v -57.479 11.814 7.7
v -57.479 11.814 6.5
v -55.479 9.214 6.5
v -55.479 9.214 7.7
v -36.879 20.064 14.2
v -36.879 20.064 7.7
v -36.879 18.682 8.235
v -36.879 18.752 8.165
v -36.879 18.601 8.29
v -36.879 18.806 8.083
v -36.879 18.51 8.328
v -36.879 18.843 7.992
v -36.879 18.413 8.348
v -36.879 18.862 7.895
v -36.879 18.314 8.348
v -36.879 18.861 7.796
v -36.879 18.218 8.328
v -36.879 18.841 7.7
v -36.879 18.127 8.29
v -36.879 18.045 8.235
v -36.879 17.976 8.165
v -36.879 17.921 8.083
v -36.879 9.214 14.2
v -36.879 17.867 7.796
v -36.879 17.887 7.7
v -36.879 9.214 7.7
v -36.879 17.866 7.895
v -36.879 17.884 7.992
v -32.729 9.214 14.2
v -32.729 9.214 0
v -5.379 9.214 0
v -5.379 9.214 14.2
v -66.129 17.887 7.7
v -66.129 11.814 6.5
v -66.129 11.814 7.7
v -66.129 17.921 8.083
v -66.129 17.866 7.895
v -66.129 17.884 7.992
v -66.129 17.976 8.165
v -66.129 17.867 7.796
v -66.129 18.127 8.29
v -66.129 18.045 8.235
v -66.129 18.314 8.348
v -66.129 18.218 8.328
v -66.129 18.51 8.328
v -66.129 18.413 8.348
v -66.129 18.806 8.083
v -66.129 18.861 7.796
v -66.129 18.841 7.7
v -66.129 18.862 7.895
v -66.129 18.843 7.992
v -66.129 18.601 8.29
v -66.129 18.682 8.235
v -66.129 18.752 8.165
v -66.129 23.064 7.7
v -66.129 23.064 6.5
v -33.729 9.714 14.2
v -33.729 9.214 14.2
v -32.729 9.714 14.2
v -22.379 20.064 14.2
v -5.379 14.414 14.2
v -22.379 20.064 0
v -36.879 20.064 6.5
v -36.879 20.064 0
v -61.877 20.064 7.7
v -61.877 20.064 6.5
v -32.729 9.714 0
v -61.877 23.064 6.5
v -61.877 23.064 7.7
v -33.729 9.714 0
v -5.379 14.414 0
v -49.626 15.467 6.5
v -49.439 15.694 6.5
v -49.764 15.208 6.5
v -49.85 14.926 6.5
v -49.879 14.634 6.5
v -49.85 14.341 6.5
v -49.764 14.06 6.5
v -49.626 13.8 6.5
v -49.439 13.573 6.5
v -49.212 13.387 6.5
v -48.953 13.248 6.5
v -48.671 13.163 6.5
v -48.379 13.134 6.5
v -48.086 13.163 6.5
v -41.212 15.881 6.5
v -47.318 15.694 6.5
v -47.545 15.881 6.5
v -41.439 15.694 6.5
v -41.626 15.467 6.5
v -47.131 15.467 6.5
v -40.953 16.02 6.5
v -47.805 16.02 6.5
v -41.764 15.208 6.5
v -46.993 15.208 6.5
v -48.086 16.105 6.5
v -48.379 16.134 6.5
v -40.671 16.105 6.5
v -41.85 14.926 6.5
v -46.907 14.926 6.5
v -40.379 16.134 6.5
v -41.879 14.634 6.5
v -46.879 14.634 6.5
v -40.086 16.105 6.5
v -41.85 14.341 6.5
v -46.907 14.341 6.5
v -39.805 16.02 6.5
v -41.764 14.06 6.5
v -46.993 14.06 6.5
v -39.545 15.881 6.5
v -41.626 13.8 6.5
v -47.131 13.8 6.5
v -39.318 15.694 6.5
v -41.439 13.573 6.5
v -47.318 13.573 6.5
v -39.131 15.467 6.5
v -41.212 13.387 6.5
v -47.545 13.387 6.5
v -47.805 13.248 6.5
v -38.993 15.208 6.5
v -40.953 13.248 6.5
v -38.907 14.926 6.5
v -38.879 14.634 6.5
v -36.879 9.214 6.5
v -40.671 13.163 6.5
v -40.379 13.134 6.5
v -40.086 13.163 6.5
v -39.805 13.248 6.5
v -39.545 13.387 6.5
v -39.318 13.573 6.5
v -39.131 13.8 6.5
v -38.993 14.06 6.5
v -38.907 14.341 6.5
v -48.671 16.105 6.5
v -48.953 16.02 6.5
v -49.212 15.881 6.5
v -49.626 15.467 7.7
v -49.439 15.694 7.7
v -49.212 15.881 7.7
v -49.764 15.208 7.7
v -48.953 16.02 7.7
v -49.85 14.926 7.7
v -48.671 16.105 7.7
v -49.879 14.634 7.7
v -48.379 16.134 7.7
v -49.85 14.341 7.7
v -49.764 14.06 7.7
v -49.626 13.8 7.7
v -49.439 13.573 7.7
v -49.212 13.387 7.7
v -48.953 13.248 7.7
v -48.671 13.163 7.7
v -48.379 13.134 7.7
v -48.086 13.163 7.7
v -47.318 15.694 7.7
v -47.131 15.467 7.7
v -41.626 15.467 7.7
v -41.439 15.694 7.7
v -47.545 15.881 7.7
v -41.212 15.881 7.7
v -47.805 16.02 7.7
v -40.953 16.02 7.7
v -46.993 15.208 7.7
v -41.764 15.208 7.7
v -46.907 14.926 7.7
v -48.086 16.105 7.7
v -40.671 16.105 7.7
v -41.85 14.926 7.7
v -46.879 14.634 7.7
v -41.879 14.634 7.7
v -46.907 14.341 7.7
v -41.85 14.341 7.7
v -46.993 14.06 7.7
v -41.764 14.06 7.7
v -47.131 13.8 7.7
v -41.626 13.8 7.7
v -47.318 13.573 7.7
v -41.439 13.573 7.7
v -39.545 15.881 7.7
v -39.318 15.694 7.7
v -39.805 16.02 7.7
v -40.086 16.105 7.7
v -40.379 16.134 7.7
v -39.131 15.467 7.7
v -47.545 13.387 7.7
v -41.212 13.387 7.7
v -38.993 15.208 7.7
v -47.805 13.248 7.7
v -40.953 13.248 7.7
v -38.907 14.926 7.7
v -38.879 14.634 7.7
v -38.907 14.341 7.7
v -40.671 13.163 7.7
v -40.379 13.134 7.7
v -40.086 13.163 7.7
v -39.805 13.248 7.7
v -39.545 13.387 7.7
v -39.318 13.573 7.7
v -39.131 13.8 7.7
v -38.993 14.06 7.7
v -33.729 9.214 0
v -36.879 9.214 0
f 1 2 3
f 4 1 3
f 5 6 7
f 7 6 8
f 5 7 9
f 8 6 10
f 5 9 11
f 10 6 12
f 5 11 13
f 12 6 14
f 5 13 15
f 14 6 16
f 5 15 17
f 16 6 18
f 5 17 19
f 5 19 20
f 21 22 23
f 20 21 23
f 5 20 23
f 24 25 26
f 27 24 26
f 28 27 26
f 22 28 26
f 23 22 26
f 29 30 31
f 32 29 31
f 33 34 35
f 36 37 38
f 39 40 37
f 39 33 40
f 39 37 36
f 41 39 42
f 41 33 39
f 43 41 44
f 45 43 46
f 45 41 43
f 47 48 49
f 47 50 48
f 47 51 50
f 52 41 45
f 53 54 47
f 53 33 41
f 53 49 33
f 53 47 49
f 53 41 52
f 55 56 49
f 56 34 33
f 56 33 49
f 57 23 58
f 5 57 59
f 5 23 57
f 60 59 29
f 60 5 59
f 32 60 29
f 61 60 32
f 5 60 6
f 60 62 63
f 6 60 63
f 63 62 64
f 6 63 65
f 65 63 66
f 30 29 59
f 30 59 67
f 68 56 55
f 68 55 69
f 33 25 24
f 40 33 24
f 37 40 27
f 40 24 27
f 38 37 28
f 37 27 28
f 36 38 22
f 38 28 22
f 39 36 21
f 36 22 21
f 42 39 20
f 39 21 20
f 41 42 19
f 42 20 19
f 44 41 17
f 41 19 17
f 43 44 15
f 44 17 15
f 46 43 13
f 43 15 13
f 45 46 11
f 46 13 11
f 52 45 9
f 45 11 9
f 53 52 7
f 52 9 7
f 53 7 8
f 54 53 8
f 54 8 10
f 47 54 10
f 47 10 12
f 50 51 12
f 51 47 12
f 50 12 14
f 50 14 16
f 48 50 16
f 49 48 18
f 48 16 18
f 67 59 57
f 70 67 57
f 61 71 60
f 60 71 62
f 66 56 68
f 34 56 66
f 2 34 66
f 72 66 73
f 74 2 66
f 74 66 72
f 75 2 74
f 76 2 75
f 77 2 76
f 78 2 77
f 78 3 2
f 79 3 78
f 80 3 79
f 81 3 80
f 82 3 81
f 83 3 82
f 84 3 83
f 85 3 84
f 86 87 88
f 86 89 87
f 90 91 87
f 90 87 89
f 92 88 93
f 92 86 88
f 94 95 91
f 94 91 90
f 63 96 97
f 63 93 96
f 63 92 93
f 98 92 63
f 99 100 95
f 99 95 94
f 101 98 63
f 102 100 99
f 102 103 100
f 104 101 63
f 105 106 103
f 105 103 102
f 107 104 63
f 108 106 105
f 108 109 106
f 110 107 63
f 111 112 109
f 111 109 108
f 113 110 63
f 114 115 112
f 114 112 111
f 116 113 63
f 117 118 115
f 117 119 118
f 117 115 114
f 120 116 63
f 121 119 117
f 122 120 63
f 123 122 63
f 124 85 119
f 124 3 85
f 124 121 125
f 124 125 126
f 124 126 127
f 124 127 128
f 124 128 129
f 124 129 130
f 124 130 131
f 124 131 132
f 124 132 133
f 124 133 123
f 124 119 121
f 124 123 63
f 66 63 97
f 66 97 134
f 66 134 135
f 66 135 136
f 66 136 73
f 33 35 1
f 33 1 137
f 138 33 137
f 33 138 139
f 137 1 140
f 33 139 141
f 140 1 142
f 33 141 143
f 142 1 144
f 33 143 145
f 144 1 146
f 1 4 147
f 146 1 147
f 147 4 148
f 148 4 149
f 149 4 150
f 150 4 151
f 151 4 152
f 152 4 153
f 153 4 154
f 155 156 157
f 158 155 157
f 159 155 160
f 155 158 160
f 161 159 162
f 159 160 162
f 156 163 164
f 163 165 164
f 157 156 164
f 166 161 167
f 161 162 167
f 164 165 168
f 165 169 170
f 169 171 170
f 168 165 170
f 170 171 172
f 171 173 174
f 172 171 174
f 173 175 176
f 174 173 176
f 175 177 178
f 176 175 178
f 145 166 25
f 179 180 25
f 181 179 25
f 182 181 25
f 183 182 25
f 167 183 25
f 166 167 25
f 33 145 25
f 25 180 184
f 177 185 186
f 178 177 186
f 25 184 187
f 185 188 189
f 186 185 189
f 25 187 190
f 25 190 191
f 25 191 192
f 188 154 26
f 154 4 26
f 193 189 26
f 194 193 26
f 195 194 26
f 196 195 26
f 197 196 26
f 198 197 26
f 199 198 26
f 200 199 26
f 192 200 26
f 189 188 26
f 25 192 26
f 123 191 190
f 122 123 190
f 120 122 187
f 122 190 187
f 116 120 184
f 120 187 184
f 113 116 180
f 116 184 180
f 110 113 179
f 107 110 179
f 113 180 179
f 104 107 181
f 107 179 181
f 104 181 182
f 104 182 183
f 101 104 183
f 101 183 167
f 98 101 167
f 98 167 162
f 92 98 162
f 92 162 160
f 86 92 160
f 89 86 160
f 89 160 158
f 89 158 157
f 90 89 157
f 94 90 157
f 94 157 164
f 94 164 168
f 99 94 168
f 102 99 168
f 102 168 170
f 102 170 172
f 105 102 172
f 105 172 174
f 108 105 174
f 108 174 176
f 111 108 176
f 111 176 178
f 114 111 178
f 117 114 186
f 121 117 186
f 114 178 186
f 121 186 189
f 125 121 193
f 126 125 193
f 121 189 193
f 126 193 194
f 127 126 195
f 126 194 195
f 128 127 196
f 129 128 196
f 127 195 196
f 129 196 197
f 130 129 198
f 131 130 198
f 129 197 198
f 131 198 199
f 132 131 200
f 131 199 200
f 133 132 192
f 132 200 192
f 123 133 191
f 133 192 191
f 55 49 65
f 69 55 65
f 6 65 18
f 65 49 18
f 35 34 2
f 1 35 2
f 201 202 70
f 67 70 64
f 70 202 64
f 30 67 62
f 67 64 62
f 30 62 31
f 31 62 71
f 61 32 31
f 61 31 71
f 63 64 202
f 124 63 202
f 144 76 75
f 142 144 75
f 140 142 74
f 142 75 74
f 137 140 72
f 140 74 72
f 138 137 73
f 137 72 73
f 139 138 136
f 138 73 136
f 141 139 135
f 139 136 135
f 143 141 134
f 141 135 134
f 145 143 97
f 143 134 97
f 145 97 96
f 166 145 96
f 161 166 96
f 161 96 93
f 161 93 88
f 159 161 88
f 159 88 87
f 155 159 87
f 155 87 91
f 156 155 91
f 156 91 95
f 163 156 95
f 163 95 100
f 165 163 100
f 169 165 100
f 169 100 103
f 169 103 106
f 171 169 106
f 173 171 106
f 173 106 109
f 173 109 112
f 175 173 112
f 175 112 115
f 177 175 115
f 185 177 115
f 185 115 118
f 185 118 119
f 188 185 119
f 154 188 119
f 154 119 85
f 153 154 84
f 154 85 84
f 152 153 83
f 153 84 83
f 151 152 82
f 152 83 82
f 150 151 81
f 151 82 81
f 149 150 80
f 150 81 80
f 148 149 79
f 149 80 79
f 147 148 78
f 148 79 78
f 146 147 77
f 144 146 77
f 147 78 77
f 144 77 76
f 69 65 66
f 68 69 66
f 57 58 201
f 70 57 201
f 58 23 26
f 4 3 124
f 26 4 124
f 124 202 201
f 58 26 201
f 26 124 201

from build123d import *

# Parameters (mm, degrees)
DODANIE_WYCI_GNI_CIE1_DEPTH = 14.2
SZKIC2_W                    = 1.2
SZKIC2_H                    = 10.85
DODANIE_WYCI_GNI_CIE3_DEPTH = 29.25
SZKIC6_W                    = 4.251450278
SZKIC6_H                    = 1.2
DODANIE_WYCI_GNI_CIE4_DEPTH = 3
SZKIC20_R                   = 1.5
WYTNIJ_WYCI_GNI_CIE5_DEPTH  = 10
WYTNIJ_WYCI_GNI_CIE3_DEPTH  = 0.5
SZKIC11_R                   = 0.5
DODANIE_WYCI_GNI_CIE5_DEPTH = 29.25
WYTNIJ_WYCI_GNI_CIE6_DEPTH  = 10
SZKIC23_R                   = 1.5
WYTNIJ_WYCI_GNI_CIE8_DEPTH  = 10


with BuildPart() as part:
    # Szkic1 → Dodanie-wyciągnięcie1 (new body)
    with BuildSketch(Plane.XY):
        Polygon((-36.878659539, 9.21375), (-5.378659539, 9.21375), (-5.378659539, 14.41375), (-22.378659539, 20.06375), (-36.878659539, 20.06375), align=None)
    extrude(amount=DODANIE_WYCI_GNI_CIE1_DEPTH)

    # Szkic2 → Dodanie-wyciągnięcie3 (add)
    with BuildSketch(Plane.ZY.offset(36.878659539)):
        with Locations((7.1, 14.63875)):
            Rectangle(SZKIC2_W, SZKIC2_H)
    extrude(amount=DODANIE_WYCI_GNI_CIE3_DEPTH)

    # Szkic6 → Dodanie-wyciągnięcie4 (add)
    with BuildSketch(Plane(origin=(0, 20.06375, 0), x_dir=(1, 0, 0), z_dir=(0, 1, 0))):
        with Locations((-64.0029344, -7.1)):
            Rectangle(SZKIC6_W, SZKIC6_H)
    extrude(amount=DODANIE_WYCI_GNI_CIE4_DEPTH)

    # Szkic20 → Wytnij-wyciągnięcie5 (cut)
    with BuildSketch(Plane.XY.offset(7.7)):
        with Locations((-40.378659539, 14.63375)):
            Circle(SZKIC20_R)
    extrude(amount=-WYTNIJ_WYCI_GNI_CIE5_DEPTH, mode=Mode.SUBTRACT)

    # Szkic10 → Wytnij-wyciągnięcie3 (cut)
    with BuildSketch(Plane.XZ.offset(-9.21375)):
        Polygon((-33.729246345, 6.369364803), (-33.729246345, 14.2), (-32.729246345, 14.2), (-32.729246345, 0), (-33.729246345, 0), align=None)
    extrude(amount=-WYTNIJ_WYCI_GNI_CIE3_DEPTH, mode=Mode.SUBTRACT)

    # Szkic11 → Dodanie-wyciągnięcie5 (add)
    with BuildSketch(Plane.ZY.offset(36.878659539)):
        with Locations((7.85, 18.36375)):
            Circle(SZKIC11_R)
    extrude(amount=DODANIE_WYCI_GNI_CIE5_DEPTH)

    # Szkic21 → Wytnij-wyciągnięcie6 (cut)
    with BuildSketch(Plane(origin=(0, 0, 6.5), x_dir=(-1, 0, 0), z_dir=(0, 0, -1))):
        Polygon((55.478659539, 9.21375), (66.128659539, 9.21375), (66.128659539, 11.81375), (57.478659539, 11.81375), align=None)
    extrude(amount=-WYTNIJ_WYCI_GNI_CIE6_DEPTH, mode=Mode.SUBTRACT)

    # Szkic23 → Wytnij-wyciągnięcie8 (cut)
    with BuildSketch(Plane(origin=(0, 0, 6.5), x_dir=(-1, 0, 0), z_dir=(0, 0, -1))):
        with Locations((48.378659539, 14.63375)):
            Circle(SZKIC23_R)
    extrude(amount=-WYTNIJ_WYCI_GNI_CIE8_DEPTH, mode=Mode.SUBTRACT)


solid = part.part
